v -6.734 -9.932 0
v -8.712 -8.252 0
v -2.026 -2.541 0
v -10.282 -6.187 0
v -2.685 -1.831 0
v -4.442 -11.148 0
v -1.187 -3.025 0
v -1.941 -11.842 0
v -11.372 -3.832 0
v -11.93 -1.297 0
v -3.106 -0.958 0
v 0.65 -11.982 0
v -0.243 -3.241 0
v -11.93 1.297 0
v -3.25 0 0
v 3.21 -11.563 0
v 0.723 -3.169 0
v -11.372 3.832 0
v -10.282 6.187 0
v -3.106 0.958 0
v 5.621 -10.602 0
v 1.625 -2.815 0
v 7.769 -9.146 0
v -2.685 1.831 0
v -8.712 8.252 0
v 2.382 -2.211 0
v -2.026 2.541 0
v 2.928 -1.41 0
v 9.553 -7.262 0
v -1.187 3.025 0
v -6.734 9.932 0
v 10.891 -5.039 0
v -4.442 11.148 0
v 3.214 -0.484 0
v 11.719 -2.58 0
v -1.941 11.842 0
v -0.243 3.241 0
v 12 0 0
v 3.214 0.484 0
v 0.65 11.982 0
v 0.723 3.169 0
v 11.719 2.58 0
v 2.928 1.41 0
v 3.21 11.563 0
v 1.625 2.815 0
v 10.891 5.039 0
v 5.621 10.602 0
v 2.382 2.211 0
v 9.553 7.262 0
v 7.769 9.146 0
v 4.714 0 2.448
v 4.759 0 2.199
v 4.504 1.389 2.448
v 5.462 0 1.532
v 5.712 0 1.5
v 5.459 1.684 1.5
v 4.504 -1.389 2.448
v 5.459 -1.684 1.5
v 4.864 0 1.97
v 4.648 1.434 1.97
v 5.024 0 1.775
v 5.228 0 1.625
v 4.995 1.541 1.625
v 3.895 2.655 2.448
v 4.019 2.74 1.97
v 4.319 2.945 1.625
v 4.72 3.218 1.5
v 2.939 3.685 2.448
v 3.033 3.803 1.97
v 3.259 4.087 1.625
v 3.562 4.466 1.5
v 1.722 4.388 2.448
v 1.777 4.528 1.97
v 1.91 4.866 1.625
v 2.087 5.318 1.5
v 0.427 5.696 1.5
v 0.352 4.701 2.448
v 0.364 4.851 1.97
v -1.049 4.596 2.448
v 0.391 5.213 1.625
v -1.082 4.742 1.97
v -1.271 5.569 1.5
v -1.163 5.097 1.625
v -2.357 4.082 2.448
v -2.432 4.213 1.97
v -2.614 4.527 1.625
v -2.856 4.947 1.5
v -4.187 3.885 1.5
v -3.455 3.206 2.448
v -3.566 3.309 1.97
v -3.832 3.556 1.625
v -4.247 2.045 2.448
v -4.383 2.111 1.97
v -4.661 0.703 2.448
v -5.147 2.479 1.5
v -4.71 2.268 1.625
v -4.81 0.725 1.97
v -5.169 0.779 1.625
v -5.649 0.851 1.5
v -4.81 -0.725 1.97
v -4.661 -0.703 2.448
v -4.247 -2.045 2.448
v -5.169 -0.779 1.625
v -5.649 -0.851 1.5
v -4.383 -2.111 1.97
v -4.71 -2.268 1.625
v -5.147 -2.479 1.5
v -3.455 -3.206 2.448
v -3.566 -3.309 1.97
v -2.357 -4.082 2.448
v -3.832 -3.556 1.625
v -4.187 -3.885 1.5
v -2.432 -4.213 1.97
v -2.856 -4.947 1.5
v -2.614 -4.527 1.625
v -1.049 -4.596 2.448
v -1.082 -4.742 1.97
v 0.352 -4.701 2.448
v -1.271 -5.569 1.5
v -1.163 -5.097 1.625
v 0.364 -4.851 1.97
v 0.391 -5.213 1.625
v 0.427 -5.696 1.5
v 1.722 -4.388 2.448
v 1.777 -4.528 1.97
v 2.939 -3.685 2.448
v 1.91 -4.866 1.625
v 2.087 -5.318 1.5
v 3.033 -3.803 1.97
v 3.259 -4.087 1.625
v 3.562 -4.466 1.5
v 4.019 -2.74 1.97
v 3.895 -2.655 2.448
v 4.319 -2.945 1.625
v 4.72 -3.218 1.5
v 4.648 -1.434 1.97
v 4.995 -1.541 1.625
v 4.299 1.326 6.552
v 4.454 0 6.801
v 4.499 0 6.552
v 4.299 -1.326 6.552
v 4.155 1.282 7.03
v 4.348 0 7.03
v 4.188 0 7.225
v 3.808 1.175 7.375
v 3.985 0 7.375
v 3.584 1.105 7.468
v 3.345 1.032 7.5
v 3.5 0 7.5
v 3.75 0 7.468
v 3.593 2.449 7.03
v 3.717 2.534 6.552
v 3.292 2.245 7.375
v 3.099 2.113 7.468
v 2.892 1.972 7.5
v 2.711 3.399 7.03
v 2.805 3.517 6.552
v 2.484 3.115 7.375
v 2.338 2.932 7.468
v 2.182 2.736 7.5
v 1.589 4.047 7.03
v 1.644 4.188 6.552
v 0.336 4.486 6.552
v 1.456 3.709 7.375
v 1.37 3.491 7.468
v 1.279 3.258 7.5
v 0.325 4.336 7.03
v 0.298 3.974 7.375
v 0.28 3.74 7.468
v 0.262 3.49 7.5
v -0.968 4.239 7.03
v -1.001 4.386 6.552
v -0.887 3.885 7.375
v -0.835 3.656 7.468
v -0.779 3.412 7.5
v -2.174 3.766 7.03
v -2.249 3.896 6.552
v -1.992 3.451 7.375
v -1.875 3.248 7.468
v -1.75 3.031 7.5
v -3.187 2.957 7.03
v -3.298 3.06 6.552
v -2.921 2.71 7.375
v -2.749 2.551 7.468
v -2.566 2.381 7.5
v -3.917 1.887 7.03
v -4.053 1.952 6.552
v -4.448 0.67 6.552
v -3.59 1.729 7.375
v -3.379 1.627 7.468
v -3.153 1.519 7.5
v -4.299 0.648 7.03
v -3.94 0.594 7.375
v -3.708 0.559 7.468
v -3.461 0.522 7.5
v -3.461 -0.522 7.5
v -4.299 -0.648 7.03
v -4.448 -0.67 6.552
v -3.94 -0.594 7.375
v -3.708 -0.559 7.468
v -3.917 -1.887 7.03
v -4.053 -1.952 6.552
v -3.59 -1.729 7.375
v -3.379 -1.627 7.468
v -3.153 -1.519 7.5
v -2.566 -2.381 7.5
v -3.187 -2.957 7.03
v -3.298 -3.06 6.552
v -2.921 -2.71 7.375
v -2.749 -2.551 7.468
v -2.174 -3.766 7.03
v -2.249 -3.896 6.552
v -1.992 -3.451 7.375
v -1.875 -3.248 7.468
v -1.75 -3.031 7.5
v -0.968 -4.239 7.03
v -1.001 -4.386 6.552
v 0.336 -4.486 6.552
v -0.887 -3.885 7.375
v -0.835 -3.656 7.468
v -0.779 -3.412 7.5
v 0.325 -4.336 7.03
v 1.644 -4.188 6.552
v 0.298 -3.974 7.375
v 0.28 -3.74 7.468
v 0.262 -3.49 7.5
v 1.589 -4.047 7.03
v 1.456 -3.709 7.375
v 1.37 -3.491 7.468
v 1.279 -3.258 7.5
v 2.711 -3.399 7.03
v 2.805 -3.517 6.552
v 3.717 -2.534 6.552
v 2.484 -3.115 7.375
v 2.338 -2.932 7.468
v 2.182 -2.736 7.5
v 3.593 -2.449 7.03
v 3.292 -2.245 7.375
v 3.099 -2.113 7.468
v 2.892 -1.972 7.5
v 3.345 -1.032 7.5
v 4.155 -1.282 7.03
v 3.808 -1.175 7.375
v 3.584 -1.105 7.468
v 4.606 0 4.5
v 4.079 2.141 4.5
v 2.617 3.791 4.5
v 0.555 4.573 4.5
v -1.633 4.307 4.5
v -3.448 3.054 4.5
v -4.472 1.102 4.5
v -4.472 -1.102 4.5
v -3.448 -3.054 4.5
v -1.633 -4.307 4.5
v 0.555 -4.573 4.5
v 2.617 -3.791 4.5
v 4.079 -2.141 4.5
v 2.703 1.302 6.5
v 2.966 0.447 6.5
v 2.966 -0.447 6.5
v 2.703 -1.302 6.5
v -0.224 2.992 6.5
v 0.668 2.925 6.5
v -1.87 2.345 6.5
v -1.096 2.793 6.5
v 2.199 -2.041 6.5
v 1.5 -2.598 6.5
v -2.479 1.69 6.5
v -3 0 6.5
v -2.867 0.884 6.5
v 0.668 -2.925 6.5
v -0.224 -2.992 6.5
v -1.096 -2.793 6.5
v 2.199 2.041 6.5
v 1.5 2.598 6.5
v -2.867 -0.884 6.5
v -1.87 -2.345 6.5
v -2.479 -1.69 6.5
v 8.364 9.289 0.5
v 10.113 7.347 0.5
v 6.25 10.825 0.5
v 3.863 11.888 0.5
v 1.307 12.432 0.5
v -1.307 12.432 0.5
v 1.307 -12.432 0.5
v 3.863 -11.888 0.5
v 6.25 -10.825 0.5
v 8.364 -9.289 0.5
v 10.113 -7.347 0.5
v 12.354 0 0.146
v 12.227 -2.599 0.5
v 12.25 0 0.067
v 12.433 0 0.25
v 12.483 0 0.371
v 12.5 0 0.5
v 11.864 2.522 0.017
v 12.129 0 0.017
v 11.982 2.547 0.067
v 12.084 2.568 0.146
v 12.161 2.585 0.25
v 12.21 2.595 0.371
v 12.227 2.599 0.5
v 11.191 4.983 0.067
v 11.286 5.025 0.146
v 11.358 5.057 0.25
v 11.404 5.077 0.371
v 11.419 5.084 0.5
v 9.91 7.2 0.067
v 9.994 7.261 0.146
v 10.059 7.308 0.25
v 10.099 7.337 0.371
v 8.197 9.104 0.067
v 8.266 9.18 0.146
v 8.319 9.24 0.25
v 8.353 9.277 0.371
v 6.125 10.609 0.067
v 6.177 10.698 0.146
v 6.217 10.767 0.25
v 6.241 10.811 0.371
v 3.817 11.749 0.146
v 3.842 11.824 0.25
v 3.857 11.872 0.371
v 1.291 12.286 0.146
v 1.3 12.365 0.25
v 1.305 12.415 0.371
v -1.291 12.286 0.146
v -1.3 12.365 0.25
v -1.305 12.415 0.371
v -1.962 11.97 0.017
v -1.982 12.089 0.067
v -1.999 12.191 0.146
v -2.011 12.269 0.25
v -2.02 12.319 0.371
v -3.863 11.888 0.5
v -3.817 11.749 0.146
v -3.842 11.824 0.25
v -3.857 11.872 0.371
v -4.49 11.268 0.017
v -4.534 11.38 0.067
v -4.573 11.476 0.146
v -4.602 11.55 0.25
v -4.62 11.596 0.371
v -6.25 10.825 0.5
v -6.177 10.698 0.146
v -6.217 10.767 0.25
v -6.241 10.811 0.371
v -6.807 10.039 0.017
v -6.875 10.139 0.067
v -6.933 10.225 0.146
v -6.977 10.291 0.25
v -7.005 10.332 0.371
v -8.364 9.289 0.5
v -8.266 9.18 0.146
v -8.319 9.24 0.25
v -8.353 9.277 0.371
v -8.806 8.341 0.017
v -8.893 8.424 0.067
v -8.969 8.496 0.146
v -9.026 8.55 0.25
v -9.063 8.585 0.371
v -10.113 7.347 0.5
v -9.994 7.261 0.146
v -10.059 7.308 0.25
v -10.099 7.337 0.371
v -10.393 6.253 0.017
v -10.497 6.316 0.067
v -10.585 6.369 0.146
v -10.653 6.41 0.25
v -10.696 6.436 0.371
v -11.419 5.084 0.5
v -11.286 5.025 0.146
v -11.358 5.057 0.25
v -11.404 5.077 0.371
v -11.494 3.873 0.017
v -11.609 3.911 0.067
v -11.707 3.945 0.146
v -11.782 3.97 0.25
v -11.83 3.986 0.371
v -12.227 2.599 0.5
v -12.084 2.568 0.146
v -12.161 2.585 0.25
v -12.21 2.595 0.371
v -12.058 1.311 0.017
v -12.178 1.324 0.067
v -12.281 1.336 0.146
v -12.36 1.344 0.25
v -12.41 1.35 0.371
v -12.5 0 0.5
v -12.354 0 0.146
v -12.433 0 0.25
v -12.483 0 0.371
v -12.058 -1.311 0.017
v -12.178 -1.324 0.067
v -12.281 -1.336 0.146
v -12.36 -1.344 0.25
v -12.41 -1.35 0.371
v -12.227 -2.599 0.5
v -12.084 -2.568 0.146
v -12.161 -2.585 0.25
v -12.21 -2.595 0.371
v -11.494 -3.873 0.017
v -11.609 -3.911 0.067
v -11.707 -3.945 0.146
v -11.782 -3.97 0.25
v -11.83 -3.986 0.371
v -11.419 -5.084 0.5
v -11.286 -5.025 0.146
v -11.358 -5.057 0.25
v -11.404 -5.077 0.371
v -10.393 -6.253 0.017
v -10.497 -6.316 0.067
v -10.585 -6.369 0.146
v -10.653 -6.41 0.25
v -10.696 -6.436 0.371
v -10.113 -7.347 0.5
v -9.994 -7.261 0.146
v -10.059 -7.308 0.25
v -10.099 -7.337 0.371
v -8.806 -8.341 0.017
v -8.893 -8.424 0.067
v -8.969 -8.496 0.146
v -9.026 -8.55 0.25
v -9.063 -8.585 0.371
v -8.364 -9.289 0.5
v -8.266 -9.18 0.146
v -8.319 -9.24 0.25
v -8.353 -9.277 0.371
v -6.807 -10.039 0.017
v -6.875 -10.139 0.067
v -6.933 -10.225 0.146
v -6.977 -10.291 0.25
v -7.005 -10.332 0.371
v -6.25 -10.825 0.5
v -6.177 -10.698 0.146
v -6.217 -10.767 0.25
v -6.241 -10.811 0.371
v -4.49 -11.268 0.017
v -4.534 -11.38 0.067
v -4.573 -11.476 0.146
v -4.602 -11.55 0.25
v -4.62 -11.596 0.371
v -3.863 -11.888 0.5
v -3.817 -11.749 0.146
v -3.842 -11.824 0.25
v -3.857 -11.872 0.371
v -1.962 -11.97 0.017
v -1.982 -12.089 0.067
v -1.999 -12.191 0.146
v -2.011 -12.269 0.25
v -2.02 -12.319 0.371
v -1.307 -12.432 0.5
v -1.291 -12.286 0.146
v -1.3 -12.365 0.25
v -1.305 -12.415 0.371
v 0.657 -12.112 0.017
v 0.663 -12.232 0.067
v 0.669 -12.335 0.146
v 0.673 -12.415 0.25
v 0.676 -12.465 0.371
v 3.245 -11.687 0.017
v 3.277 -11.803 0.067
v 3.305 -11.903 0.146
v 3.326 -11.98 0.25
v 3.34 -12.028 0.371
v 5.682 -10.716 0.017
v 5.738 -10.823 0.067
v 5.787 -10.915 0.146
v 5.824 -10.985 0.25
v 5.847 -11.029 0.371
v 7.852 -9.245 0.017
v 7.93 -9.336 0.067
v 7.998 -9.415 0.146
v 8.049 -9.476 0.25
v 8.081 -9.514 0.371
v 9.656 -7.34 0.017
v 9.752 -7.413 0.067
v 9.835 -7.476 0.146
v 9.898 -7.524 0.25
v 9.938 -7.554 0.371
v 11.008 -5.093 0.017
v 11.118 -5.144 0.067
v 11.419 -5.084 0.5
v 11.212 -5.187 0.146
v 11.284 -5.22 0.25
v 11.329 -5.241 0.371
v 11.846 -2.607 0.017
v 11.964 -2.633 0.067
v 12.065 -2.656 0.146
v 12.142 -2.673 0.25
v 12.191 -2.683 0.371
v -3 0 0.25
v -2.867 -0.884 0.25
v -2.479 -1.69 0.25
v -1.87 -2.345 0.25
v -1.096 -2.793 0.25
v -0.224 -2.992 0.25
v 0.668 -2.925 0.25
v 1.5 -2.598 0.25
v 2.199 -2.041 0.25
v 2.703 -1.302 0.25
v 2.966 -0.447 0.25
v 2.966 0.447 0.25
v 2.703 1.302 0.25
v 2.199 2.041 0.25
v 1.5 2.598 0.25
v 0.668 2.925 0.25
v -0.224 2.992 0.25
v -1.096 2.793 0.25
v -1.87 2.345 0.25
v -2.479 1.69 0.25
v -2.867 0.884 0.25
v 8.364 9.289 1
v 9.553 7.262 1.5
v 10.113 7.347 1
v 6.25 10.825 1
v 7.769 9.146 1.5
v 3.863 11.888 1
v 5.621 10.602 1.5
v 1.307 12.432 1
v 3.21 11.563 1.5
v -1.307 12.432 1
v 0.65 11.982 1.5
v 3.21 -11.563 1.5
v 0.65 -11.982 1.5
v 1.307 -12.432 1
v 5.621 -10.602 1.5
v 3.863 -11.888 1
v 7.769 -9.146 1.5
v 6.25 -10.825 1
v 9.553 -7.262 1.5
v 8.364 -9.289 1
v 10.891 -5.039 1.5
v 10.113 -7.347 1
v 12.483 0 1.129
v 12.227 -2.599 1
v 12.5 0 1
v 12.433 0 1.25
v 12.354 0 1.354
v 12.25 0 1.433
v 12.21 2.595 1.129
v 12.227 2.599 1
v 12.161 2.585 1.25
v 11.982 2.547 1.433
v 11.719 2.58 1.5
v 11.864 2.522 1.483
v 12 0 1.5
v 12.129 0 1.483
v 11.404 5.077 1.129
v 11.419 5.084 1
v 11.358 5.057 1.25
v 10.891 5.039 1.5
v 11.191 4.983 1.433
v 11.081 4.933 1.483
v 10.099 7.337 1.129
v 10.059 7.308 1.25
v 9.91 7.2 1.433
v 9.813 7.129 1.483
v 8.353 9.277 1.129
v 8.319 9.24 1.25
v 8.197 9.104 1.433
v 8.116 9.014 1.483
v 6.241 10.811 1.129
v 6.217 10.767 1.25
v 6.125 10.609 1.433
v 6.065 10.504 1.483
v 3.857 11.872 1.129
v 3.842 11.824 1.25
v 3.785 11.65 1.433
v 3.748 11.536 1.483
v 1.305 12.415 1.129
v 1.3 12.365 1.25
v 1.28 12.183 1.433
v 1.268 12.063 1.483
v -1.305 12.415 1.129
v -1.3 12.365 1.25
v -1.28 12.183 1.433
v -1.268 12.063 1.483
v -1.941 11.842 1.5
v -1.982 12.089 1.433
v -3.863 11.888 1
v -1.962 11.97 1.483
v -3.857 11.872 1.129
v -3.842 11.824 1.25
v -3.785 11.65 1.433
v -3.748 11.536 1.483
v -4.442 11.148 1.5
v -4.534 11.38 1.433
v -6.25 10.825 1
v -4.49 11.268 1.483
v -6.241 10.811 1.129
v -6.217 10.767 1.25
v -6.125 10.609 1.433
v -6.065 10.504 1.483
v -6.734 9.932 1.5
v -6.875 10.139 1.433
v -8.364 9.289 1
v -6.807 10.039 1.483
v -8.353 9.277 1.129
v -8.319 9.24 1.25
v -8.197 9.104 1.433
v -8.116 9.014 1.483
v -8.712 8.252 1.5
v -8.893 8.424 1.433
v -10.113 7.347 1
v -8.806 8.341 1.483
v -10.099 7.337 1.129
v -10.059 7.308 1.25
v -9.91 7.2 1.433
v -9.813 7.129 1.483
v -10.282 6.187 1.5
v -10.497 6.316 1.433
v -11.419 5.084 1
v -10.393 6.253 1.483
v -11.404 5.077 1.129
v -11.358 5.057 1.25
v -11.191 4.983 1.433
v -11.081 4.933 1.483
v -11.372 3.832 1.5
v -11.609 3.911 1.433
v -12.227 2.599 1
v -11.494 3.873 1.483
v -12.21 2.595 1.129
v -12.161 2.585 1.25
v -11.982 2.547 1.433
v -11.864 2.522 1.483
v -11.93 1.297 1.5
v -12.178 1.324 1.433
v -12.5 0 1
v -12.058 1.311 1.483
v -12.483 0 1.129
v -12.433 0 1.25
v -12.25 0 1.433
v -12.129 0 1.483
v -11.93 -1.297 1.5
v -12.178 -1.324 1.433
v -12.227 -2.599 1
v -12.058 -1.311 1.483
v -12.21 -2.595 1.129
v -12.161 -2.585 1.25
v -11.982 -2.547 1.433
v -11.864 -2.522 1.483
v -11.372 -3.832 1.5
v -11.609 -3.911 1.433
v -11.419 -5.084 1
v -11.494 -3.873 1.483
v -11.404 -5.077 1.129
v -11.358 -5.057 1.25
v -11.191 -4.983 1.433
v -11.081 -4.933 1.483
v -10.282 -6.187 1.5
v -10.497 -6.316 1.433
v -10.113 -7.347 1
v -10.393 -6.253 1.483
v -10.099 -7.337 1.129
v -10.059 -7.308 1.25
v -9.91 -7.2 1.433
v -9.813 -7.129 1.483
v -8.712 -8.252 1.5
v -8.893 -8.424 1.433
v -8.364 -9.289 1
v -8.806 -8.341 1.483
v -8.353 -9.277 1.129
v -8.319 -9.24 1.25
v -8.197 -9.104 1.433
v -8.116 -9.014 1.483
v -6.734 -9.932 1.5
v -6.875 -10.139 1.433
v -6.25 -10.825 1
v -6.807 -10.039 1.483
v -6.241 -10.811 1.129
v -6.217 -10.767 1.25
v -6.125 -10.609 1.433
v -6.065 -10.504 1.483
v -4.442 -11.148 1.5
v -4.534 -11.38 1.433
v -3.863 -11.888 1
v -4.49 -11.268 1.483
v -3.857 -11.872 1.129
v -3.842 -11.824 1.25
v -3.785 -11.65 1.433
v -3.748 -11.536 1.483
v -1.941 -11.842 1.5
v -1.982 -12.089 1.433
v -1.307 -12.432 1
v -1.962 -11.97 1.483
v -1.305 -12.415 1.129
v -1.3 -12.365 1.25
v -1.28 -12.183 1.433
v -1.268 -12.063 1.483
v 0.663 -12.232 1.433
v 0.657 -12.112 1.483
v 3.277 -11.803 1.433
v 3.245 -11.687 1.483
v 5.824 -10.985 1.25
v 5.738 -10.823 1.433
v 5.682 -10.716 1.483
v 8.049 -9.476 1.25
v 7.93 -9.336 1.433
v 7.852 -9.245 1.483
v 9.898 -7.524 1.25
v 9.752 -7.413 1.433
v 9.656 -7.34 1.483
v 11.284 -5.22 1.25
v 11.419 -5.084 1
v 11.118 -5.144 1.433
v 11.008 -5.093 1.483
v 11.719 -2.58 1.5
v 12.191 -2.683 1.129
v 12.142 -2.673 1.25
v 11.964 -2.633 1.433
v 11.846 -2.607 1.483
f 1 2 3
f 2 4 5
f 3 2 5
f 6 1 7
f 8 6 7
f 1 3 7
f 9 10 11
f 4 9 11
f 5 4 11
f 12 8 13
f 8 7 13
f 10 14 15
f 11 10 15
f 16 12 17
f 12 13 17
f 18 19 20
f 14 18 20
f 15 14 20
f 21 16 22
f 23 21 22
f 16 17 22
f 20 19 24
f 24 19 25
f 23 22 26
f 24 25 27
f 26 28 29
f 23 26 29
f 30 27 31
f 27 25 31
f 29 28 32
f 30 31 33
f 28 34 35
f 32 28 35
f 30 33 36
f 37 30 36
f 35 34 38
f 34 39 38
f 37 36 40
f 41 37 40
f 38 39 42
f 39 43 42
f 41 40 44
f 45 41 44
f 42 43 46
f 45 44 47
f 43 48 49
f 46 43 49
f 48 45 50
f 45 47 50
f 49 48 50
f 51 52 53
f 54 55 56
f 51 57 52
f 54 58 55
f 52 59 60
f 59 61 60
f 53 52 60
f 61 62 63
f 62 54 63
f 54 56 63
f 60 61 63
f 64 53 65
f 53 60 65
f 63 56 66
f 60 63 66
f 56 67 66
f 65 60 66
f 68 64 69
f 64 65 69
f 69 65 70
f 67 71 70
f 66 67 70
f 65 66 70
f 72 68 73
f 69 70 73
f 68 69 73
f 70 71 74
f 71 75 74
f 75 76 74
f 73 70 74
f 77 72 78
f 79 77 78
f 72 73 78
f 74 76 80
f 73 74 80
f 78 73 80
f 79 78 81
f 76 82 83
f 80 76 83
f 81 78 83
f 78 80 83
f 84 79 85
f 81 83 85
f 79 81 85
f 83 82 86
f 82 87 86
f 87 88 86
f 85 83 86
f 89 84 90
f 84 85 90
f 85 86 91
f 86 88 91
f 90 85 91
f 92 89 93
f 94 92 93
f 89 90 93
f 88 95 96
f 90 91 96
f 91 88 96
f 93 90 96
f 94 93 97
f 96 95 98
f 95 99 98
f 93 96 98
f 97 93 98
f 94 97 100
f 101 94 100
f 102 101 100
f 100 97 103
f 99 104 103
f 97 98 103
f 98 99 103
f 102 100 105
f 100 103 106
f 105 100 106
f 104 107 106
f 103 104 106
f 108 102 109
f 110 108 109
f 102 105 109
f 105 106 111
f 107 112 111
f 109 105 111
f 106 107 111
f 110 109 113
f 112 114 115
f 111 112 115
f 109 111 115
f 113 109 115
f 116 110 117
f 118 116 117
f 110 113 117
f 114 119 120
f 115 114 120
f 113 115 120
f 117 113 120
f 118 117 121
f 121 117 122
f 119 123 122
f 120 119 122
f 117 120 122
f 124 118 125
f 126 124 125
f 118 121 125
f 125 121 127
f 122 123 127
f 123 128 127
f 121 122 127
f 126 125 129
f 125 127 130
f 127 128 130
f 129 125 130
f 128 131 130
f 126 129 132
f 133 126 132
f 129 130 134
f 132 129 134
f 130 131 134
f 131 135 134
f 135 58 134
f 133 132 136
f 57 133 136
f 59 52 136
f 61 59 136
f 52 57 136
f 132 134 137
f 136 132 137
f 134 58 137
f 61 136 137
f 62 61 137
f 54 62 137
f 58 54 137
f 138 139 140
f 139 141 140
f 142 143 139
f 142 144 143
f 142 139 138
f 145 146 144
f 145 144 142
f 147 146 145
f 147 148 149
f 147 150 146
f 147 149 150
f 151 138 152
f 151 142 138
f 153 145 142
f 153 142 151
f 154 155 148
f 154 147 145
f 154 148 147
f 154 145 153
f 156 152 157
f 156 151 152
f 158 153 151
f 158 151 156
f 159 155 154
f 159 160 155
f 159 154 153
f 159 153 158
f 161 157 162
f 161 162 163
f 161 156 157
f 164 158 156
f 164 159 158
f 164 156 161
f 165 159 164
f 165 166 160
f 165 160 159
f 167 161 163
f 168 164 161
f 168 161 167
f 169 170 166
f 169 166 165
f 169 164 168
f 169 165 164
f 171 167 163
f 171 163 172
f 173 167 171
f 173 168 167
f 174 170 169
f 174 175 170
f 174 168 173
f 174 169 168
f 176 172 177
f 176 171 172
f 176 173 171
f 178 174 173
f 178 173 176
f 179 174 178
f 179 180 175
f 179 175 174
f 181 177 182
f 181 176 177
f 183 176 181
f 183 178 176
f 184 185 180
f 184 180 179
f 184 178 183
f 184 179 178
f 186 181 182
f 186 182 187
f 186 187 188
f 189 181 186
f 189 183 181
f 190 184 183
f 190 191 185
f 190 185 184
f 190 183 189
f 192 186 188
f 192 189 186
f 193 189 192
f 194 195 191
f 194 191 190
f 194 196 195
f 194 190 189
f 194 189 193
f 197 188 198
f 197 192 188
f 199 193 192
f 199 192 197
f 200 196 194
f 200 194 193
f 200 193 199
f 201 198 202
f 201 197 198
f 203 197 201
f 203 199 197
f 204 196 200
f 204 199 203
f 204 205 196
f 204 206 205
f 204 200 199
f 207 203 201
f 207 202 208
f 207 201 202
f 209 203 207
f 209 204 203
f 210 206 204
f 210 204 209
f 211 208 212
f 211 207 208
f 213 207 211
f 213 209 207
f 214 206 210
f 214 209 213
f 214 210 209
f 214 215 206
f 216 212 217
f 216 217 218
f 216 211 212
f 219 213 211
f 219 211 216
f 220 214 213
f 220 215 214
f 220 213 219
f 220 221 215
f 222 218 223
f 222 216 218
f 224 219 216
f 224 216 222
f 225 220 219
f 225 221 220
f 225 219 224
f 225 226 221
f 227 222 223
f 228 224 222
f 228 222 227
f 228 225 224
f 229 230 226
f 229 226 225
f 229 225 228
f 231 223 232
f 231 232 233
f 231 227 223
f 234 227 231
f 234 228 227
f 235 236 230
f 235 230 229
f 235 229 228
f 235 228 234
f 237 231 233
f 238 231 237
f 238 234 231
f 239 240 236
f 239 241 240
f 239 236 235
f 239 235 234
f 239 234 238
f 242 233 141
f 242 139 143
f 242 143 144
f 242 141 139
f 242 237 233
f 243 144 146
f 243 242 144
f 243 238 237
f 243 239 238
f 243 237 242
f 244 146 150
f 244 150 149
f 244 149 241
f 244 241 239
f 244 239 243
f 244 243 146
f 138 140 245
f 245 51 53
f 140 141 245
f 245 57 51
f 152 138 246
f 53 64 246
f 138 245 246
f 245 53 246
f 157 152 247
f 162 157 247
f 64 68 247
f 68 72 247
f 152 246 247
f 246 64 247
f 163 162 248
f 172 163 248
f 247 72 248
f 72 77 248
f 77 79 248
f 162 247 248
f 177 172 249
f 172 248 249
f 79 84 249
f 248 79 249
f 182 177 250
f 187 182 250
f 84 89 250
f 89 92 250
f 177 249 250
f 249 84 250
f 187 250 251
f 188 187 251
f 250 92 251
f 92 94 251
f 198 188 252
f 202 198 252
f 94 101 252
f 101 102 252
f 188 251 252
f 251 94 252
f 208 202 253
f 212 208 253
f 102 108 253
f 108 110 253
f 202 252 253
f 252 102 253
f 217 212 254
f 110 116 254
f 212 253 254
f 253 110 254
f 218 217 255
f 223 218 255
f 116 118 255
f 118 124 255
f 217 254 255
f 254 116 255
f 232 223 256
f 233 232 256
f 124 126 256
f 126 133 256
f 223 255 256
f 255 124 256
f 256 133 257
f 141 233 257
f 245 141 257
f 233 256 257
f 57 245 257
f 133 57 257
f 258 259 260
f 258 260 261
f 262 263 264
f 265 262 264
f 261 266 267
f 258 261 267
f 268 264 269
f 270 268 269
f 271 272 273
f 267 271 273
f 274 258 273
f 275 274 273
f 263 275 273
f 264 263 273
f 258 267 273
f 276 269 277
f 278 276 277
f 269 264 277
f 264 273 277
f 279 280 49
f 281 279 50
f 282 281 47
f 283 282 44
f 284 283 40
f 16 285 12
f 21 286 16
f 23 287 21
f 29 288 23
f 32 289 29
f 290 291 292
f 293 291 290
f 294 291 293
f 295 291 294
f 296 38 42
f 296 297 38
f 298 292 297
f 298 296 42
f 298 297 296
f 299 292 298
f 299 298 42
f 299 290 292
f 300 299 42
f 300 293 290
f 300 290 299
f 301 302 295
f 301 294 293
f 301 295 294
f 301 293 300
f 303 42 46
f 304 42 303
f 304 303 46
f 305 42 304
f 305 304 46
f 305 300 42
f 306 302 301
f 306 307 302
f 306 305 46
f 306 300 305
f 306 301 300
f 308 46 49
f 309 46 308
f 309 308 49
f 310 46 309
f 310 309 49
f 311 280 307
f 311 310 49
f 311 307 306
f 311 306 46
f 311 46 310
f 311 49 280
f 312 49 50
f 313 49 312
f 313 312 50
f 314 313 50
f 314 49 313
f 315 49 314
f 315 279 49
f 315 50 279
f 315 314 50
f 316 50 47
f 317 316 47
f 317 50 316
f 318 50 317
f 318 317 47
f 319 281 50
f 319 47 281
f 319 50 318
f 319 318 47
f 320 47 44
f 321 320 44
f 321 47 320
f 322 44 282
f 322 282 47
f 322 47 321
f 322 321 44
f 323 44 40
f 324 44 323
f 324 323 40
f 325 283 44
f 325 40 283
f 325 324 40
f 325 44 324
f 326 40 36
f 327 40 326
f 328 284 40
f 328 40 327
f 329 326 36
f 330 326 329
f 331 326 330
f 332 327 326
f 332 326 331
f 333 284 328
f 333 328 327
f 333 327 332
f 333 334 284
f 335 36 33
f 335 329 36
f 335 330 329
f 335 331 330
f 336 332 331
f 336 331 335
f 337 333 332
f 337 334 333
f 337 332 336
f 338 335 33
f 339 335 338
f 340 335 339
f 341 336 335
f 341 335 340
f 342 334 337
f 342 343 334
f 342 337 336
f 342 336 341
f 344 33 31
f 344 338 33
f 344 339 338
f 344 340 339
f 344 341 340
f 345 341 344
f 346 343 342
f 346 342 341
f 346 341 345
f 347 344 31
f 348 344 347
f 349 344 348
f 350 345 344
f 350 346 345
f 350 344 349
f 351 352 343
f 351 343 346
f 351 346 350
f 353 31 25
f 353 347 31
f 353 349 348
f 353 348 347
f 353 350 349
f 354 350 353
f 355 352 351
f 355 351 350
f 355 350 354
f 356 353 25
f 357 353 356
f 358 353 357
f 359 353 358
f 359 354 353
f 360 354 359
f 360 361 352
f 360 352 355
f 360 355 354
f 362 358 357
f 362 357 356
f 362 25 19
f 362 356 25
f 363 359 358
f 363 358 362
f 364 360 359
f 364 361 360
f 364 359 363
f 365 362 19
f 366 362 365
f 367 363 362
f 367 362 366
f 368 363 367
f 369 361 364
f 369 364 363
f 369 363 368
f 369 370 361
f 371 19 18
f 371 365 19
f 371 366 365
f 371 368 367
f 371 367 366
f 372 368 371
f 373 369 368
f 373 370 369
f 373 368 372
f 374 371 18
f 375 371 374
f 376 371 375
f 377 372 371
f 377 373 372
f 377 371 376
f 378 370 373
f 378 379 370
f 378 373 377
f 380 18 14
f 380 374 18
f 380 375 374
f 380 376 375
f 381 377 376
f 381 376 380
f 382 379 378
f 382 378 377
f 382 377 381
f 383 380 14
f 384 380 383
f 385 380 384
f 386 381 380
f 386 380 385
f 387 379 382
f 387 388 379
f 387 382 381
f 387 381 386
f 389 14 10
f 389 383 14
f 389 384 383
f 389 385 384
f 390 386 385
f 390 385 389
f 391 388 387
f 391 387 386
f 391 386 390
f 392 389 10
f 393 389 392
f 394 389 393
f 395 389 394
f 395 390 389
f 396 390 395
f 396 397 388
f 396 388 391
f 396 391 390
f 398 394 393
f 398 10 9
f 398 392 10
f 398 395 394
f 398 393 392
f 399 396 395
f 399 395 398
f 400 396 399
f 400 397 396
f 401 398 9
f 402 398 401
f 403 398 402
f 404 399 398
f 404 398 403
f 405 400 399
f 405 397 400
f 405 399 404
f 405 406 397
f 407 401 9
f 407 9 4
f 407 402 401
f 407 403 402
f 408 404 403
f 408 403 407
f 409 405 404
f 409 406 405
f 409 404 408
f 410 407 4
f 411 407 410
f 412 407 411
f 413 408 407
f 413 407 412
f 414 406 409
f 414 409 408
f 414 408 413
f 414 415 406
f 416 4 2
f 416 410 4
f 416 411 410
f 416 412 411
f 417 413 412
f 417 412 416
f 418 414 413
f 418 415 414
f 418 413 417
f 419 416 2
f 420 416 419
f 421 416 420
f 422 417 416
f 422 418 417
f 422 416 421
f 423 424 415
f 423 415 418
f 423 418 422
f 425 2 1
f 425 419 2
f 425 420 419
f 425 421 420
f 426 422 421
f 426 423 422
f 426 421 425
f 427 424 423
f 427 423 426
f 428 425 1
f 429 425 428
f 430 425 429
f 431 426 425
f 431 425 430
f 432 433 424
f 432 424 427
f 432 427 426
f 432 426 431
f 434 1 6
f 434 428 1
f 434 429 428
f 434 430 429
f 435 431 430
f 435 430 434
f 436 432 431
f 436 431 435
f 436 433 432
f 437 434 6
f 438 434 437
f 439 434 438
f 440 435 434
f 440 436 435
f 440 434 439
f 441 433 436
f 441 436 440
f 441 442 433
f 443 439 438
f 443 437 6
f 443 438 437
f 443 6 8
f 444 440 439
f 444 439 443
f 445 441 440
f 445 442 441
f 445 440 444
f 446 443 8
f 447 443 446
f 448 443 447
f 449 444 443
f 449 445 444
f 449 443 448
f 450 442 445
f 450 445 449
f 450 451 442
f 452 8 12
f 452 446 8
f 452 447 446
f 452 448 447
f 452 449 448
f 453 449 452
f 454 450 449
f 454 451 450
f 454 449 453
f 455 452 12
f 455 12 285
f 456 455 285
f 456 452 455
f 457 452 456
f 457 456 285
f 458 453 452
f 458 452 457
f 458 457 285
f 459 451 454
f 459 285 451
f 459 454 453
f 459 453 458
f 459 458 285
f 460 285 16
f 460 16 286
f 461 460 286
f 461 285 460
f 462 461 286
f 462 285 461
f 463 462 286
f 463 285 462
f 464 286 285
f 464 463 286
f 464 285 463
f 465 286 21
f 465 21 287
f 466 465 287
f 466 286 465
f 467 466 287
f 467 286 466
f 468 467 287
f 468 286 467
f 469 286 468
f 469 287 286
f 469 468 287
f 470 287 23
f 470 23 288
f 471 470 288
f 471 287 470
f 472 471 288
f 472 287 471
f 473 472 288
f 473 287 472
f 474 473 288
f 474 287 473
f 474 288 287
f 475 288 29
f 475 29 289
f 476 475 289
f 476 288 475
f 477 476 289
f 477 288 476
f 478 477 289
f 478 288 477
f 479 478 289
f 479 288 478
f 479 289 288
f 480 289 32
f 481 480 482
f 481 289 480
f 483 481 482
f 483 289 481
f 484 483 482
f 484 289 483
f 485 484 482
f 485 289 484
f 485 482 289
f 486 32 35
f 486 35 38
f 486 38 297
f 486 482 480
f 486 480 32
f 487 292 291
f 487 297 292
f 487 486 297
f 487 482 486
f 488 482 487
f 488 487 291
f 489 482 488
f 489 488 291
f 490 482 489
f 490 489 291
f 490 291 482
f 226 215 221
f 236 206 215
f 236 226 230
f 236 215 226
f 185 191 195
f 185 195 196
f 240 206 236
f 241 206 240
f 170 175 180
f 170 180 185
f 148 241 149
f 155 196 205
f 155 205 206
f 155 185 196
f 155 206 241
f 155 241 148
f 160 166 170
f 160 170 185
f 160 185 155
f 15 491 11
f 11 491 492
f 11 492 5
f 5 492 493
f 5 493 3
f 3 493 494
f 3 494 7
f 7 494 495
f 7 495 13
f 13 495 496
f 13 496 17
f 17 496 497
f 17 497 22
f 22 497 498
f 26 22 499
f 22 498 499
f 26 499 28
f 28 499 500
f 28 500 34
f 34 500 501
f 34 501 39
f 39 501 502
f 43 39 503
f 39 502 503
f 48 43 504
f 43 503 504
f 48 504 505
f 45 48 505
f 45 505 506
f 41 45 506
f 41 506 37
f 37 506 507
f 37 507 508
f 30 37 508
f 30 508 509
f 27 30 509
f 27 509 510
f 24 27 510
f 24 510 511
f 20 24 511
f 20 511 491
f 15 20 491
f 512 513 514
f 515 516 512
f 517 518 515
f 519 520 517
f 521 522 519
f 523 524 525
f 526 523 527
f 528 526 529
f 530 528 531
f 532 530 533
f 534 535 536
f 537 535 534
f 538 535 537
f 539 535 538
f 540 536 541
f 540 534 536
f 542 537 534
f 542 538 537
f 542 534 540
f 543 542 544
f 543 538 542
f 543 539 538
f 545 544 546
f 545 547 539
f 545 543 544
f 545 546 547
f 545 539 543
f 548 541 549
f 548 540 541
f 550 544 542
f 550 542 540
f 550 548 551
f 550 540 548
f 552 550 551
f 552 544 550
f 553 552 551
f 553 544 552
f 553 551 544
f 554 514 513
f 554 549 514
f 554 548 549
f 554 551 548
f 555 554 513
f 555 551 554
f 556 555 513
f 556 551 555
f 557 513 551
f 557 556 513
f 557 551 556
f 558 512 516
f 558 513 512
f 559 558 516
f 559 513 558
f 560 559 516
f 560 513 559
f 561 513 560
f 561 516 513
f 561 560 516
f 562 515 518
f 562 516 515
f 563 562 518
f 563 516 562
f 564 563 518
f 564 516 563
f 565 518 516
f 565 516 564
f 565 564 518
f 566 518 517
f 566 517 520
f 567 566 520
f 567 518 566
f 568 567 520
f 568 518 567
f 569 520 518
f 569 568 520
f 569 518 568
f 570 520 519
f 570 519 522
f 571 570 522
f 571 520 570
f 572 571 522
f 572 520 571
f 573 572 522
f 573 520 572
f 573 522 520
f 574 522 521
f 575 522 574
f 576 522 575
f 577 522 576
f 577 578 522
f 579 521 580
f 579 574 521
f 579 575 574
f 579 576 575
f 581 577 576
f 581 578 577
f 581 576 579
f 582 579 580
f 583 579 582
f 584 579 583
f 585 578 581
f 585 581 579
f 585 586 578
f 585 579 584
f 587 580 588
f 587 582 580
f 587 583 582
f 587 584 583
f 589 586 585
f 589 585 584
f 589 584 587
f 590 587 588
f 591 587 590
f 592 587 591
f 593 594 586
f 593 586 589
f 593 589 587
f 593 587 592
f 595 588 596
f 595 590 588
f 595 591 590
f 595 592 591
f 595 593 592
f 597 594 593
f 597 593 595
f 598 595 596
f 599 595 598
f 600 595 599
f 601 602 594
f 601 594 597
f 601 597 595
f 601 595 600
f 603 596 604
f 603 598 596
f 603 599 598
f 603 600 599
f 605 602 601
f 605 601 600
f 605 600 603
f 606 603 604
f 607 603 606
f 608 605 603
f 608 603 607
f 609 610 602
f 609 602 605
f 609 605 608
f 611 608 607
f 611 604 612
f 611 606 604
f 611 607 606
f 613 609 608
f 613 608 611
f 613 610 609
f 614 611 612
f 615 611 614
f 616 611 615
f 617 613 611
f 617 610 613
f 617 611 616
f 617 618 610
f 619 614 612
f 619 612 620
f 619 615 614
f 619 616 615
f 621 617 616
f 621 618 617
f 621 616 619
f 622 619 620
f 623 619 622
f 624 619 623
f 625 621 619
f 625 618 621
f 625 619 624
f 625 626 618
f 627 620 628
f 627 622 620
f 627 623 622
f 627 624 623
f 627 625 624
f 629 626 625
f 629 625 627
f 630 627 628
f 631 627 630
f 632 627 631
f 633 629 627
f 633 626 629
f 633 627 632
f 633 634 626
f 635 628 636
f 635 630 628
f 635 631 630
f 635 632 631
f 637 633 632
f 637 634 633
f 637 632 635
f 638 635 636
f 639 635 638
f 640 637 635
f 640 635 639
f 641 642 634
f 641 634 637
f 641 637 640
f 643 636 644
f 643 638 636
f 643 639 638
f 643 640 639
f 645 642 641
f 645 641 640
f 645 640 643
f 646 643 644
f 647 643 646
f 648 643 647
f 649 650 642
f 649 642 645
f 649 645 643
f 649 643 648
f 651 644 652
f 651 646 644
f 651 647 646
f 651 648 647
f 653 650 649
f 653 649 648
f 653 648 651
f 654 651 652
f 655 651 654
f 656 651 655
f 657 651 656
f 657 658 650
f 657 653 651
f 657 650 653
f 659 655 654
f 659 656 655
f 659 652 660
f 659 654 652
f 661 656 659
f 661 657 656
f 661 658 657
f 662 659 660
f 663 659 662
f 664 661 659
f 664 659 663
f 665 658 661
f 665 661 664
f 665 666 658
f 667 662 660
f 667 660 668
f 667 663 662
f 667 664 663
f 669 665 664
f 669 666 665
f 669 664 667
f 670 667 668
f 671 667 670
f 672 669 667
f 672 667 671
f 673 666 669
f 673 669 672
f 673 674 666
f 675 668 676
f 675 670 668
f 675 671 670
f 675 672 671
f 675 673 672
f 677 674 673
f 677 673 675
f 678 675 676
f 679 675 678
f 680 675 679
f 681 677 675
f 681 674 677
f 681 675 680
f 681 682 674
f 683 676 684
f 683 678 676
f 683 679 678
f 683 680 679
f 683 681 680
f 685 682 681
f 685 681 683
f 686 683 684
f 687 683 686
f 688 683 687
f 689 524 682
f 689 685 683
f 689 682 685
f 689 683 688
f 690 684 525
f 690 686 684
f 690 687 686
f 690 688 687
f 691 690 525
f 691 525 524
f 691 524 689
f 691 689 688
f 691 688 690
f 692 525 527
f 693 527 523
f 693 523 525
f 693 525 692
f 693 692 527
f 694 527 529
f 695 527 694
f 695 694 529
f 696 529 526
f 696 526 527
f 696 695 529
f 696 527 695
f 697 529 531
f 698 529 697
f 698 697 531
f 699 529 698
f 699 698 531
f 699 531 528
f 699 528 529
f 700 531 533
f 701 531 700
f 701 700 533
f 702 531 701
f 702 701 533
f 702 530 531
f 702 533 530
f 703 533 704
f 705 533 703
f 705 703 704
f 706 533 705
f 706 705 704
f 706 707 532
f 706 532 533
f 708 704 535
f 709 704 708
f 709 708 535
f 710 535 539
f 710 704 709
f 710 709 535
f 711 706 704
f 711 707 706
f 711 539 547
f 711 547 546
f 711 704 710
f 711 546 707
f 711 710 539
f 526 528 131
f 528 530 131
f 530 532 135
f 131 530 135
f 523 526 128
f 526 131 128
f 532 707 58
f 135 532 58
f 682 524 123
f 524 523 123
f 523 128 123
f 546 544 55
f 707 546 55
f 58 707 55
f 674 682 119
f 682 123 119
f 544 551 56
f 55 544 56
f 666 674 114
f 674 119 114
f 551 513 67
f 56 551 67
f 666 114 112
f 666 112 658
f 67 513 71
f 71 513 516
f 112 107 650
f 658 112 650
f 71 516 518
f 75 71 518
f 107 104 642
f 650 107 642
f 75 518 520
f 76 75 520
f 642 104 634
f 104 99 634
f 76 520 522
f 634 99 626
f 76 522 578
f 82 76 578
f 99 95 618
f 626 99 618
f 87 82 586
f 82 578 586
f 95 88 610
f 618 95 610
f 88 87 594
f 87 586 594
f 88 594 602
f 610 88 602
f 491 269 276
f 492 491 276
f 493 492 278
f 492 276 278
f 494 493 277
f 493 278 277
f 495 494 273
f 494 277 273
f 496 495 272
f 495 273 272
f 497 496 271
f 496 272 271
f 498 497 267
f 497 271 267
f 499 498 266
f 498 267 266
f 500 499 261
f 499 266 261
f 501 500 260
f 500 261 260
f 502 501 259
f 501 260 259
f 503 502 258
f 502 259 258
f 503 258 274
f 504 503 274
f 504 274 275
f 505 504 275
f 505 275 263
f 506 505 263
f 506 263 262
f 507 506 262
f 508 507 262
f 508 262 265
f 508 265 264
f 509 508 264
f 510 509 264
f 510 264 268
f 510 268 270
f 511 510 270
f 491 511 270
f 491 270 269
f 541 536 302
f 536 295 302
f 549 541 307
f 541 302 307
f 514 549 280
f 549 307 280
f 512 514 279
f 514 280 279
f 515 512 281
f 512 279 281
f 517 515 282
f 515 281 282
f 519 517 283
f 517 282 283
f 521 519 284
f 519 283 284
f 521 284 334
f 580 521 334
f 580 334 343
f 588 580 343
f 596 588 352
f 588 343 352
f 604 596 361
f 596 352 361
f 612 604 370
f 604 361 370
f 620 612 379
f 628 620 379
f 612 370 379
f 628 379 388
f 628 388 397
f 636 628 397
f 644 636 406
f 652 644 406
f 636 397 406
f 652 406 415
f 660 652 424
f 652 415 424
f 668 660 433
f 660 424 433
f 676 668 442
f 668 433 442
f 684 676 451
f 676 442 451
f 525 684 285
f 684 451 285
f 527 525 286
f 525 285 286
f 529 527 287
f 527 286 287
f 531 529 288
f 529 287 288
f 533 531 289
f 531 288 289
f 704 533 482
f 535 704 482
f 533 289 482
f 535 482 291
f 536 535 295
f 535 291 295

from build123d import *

# Parameters (mm, degrees)
HOLE_D           = 6
HOLE_DEPTH       = 6.5
HOLE_CSINK_D     = 6.5
HOLE_CSINK_ANGLE = 90


with BuildPart() as part:
    # Sketch → Revolution (revolve)
    with BuildSketch(Plane.XZ):
        with BuildLine():
            Line((12.5, 1), (12.5, 0.5))
            ThreePointArc((12, 0), (12.353553, 0.146447), (12.5, 0.5))
            Line((12, 0), (0, 0))
            Line((0, 7.5), (0, 0))
            Line((3.5, 7.5), (0, 7.5))
            ThreePointArc((4.49863, 6.552336), (4.188355, 7.225374), (3.5, 7.5))
            Line((4.49863, 6.552336), (4.713746, 2.447664))
            ThreePointArc((4.713746, 2.447664), (5.024021, 1.774626), (5.712376, 1.5))
            Line((5.712376, 1.5), (12, 1.5))
            ThreePointArc((12.5, 1), (12.353553, 1.353553), (12, 1.5))
        make_face()
    revolve(axis=Axis((0, 0, 0), (0, 0, 1)))

    # Hole
    with Locations(Plane(origin=(0, 0, 0), x_dir=(1, 0, 0), z_dir=(0, 0, -1))):
        with Locations((0, 0)):
            CounterSinkHole(HOLE_D / 2, HOLE_CSINK_D / 2, depth=HOLE_DEPTH, counter_sink_angle=HOLE_CSINK_ANGLE)


solid = part.part
